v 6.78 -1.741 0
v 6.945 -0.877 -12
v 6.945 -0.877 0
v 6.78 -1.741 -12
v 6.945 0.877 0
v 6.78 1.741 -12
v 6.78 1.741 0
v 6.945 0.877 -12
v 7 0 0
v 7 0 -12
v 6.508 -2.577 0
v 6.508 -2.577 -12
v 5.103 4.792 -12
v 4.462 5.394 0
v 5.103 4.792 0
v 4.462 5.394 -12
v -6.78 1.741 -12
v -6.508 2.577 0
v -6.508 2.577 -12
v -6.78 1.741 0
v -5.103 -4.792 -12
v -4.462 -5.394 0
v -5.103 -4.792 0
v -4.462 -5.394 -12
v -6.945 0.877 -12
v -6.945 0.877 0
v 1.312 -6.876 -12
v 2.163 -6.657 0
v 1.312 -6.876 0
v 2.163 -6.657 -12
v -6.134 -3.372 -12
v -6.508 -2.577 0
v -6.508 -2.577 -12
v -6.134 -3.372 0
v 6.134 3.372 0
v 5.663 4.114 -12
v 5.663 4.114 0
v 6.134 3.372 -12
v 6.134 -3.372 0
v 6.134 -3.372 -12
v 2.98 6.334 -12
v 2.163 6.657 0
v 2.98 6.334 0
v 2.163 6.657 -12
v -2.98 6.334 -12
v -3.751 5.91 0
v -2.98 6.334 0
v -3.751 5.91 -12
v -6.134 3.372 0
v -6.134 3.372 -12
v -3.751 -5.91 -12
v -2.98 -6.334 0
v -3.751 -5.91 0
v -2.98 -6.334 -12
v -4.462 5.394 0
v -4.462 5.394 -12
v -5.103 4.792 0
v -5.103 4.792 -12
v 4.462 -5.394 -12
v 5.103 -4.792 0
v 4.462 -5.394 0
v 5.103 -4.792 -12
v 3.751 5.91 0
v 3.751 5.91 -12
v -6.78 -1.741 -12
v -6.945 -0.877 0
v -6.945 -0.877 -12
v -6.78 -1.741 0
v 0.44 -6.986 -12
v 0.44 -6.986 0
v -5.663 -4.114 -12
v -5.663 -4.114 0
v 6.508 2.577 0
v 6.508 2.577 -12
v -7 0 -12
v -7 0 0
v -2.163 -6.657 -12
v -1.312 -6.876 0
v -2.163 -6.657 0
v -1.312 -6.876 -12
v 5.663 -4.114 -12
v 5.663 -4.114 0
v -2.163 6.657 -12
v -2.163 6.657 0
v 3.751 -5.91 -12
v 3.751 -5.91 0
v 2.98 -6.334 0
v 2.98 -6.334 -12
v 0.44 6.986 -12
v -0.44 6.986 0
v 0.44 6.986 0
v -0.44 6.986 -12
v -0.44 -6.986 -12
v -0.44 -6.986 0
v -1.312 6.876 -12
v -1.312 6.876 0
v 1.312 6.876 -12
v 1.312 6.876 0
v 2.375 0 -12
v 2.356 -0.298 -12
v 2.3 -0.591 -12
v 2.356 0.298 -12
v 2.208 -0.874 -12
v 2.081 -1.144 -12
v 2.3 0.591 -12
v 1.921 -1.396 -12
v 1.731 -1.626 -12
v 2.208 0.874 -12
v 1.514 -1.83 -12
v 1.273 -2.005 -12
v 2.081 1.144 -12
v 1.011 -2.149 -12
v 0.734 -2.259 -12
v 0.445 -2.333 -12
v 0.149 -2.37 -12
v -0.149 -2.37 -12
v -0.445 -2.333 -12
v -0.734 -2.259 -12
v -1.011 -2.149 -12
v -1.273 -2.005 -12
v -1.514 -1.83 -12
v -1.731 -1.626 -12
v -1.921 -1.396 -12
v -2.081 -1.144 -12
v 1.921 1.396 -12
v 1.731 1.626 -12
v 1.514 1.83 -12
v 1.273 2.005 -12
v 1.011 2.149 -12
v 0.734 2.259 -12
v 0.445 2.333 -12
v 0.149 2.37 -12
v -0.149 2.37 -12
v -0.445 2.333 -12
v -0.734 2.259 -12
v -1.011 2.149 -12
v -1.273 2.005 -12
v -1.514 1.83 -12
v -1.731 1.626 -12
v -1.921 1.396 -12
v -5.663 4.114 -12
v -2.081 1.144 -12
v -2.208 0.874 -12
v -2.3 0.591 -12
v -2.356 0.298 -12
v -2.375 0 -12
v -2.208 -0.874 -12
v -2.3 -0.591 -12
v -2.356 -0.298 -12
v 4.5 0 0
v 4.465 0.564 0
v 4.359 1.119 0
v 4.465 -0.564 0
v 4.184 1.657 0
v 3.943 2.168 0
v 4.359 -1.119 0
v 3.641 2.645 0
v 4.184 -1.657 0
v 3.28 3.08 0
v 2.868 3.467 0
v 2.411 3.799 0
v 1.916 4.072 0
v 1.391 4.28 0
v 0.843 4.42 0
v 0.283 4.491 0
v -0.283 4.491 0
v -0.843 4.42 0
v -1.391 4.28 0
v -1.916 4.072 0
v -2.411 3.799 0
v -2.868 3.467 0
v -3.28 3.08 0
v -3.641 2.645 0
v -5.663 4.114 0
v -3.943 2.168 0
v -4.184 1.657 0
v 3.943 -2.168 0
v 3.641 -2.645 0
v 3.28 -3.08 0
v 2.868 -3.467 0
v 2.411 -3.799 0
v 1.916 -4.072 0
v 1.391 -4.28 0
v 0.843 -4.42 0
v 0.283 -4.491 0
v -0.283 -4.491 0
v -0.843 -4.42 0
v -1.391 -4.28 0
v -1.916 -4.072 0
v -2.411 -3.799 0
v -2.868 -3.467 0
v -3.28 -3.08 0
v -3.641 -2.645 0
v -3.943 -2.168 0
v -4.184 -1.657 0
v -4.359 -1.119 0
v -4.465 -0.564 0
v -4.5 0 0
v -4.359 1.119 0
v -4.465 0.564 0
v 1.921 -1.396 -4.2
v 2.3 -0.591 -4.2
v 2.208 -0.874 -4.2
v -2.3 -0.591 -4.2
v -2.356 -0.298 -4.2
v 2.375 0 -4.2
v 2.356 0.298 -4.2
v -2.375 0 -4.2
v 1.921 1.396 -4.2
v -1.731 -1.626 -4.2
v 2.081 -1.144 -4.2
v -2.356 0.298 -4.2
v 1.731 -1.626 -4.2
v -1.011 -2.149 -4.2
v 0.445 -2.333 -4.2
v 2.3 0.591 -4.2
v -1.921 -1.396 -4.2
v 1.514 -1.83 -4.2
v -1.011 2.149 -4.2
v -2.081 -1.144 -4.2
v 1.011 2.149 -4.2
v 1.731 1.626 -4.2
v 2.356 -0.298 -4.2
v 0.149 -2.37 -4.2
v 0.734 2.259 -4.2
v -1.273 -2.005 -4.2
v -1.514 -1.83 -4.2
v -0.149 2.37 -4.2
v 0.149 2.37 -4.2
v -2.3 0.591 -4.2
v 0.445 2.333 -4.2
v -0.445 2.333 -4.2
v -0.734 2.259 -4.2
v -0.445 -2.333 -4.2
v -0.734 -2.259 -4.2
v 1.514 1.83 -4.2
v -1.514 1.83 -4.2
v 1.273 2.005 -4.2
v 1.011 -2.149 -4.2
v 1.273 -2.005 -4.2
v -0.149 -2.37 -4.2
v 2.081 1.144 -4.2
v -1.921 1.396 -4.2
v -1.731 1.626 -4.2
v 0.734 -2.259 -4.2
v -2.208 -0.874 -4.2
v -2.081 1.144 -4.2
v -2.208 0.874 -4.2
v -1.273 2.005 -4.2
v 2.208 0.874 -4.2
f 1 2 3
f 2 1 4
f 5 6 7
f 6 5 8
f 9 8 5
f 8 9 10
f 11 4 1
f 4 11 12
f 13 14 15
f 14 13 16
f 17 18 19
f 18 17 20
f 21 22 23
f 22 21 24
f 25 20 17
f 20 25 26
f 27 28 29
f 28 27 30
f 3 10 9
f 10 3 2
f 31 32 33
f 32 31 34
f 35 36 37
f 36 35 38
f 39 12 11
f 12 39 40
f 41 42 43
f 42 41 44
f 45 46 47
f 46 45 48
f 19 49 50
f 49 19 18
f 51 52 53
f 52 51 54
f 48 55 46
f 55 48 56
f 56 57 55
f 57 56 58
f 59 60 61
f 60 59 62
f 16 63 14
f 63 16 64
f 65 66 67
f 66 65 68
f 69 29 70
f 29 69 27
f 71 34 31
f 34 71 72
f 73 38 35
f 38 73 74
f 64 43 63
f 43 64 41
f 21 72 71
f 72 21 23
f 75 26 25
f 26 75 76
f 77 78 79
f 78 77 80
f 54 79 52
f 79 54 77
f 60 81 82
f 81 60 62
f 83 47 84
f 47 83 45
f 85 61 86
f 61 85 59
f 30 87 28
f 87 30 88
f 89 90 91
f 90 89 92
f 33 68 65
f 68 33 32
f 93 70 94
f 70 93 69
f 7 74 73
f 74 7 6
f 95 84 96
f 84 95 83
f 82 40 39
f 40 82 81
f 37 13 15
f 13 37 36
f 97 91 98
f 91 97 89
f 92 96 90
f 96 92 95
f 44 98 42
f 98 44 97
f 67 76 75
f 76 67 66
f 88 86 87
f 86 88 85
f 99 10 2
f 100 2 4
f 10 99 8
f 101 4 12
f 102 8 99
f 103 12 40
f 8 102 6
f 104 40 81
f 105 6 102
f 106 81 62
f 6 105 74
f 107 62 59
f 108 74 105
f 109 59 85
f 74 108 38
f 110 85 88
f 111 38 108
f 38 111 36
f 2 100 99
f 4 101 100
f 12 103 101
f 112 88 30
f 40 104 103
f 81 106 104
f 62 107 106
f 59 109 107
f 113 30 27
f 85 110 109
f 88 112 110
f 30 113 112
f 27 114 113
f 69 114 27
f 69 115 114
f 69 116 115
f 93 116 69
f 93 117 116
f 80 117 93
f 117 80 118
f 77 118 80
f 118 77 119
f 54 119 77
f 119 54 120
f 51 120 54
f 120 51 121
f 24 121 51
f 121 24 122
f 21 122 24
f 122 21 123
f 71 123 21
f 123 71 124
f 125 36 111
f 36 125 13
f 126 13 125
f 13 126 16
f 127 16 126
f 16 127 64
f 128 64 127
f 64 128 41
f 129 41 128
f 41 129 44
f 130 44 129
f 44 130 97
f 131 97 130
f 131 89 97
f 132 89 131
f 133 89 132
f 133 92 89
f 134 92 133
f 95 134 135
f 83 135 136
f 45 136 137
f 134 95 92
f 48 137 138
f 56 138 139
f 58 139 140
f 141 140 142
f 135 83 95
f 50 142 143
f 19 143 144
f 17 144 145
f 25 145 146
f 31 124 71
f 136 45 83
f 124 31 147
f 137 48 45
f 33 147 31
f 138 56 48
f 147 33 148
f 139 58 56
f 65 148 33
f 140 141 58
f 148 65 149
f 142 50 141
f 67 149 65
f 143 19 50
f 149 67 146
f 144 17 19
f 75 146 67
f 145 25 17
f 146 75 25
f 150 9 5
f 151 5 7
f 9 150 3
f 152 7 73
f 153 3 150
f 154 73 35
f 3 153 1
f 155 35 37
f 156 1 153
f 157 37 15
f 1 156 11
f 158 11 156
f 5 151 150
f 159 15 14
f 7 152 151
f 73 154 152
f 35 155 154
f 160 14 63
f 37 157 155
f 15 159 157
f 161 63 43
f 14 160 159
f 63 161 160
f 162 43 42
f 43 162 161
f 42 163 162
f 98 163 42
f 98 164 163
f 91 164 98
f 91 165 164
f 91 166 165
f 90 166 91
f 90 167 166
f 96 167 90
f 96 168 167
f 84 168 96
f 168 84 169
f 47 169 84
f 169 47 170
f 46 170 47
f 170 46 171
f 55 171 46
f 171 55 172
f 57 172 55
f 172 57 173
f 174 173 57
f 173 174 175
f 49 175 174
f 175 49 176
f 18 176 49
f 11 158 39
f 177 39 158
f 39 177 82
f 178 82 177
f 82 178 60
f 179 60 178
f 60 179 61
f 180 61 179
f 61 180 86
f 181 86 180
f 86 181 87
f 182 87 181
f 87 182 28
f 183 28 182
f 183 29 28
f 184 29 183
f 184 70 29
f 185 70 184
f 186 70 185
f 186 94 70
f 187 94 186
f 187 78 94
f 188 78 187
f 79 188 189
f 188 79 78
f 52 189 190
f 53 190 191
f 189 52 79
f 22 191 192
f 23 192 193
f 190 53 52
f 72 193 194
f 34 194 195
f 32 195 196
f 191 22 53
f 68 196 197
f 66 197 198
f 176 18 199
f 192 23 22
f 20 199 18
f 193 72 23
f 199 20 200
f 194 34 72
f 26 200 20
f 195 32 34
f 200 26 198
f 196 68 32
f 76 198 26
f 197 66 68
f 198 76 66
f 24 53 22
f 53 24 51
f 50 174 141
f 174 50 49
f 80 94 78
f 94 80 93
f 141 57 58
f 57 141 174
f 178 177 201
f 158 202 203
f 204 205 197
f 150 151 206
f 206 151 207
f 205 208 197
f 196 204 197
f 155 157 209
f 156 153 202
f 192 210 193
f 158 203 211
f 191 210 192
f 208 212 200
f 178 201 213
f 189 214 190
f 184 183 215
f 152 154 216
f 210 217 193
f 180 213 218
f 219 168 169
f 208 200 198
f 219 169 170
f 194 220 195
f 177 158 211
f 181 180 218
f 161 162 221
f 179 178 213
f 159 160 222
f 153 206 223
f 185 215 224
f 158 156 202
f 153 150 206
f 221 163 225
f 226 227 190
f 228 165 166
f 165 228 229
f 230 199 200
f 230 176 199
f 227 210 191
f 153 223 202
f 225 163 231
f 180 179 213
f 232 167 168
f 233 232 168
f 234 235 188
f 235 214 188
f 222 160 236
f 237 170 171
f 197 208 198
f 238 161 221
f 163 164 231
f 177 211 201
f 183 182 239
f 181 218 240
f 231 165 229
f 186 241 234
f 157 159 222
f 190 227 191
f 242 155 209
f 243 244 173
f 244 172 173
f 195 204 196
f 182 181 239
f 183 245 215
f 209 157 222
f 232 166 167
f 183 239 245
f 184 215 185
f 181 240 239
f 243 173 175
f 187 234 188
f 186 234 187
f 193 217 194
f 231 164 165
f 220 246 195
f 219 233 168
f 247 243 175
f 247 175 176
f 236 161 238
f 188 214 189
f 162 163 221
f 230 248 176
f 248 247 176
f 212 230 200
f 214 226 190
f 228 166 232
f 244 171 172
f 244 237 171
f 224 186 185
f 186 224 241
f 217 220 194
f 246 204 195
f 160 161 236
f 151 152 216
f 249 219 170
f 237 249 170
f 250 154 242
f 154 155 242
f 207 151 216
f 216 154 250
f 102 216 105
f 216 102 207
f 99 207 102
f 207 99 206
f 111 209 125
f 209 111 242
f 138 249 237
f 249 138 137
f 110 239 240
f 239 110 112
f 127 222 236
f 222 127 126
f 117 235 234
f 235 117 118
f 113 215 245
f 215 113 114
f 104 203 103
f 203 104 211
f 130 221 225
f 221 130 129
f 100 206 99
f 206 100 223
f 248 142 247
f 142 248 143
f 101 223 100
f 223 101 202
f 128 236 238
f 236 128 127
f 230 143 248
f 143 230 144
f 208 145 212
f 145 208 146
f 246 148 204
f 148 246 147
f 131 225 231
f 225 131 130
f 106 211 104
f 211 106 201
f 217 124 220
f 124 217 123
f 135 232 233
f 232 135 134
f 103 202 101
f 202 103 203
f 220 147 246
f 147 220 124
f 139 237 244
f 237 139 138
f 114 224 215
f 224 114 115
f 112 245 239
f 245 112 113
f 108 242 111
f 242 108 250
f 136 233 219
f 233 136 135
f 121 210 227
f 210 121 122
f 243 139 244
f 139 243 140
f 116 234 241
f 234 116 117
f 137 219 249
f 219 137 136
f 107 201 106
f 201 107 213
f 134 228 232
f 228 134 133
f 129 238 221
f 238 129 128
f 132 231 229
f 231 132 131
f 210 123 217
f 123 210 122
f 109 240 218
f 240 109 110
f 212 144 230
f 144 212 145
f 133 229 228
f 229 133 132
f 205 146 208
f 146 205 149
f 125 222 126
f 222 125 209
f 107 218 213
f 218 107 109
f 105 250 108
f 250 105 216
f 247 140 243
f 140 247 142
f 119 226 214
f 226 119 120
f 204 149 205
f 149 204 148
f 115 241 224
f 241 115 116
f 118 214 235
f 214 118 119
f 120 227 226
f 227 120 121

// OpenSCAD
$fn = 50;


difference() {
	union() {
		translate(v = [0, 0, -12.0000000000]) {
			cylinder(h = 12, r = 7.0000000000);
		}
		translate(v = [0, 0, -12.0000000000]) {
			cylinder(h = 12, r = 2.8750000000);
		}
	}
	union() {
		translate(v = [0, 0, 0]) {
			rotate(a = [0, 0, 0]) {
				difference() {
					union() {
						translate(v = [0, 0, -12.0000000000]) {
							cylinder(h = 12, r = 2.2500000000);
						}
						translate(v = [0, 0, -4.2000000000]) {
							cylinder(h = 4.2000000000, r1 = 2.3750000000, r2 = 4.5000000000);
						}
						translate(v = [0, 0, -12.0000000000]) {
							cylinder(h = 12, r = 2.3750000000);
						}
						translate(v = [0, 0, -12.0000000000]) {
							cylinder(h = 12, r = 2.2500000000);
						}
					}
					union();
				}
			}
		}
	}
}
